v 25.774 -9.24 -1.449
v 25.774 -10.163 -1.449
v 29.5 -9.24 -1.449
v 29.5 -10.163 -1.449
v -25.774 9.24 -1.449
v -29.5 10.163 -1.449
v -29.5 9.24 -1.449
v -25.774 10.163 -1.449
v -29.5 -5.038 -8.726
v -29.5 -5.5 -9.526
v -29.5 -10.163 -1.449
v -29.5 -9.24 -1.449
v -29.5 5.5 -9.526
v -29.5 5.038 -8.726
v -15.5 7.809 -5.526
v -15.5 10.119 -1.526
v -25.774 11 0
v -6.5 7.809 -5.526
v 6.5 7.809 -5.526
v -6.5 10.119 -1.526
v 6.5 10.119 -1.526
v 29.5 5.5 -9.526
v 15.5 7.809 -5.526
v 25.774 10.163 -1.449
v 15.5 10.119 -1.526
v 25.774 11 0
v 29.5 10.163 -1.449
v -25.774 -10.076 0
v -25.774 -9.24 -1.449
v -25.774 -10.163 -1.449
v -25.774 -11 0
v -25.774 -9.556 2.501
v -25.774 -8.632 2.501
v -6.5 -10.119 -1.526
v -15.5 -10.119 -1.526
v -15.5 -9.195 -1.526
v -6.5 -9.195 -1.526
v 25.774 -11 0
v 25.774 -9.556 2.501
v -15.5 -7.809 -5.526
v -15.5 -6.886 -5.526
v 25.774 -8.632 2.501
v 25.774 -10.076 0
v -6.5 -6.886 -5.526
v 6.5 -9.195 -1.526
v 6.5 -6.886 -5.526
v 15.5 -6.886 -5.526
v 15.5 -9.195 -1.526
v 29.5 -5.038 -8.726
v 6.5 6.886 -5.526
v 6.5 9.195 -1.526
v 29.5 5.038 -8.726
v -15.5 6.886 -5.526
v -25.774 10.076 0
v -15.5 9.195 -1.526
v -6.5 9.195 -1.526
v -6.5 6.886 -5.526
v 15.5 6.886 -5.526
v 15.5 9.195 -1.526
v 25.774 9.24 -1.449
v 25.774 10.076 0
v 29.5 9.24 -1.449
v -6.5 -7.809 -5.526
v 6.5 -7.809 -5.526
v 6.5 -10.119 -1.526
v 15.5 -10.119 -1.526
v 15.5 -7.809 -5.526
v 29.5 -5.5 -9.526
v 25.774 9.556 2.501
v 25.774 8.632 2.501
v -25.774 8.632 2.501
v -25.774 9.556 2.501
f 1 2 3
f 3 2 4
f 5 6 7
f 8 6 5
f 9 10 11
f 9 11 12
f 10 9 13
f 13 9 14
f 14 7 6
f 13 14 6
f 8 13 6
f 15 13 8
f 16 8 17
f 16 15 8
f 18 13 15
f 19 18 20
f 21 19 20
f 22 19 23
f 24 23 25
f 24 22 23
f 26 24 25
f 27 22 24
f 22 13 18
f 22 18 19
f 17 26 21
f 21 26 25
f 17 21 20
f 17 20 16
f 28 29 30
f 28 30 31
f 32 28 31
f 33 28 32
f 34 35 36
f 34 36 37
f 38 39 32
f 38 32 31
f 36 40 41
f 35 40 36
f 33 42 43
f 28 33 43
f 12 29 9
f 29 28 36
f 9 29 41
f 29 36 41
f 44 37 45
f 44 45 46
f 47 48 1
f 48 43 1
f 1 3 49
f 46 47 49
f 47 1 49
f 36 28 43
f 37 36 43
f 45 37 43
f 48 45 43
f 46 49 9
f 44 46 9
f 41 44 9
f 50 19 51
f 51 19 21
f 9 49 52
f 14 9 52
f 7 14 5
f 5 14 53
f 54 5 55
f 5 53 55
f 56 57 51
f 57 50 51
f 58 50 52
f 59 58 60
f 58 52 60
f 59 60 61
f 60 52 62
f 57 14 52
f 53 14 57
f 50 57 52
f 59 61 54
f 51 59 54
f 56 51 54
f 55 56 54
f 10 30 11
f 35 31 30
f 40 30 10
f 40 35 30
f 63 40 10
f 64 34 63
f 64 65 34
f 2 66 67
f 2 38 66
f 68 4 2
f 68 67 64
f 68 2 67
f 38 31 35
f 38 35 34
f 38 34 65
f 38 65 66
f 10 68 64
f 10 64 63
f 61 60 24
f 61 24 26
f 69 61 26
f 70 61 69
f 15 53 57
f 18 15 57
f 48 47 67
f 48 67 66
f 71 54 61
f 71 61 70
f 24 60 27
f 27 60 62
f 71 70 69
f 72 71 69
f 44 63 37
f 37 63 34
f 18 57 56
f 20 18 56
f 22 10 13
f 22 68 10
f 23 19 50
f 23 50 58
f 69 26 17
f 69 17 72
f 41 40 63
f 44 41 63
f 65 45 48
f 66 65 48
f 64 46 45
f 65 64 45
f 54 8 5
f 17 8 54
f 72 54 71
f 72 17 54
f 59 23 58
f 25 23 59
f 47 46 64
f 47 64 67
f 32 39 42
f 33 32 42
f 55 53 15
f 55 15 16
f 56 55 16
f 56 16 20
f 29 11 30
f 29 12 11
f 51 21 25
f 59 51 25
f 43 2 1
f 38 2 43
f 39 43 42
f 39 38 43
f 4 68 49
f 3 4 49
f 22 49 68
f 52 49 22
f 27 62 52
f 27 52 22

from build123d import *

# Parameters (mm, degrees)
F2_DEPTH = 29.5
F3_DEPTH = 30
F5_DEPTH = 45.85
F6_W     = 9
F6_H     = 4
F7_DEPTH = 12.5
F8_W     = 4
F8_H     = 4
F9_DEPTH = 12.5


with BuildPart() as f2:
    # F0 (on Right) → F2 (new body, symmetric)
    with BuildSketch(Plane.YZ):
        Polygon((11, 0), (5.5, 9.526279), (-5.5, 9.526279), (-11, 0), (-5.5, -9.526279), (5.5, -9.526279), align=None)
    extrude(amount=F2_DEPTH, both=True)

    # F1 (on Right) → F3 (cut, symmetric)
    with BuildSketch(Plane.YZ):
        Polygon((-5.03812, 8.726279), (-10.07624, 0), (-5.03812, -8.726279), (5.03812, -8.726279), (10.07624, 0), (5.03812, 8.726279), align=None)
    extrude(amount=F3_DEPTH, both=True, mode=Mode.SUBTRACT)

    # F4 (on face) → F5 (cut, symmetric)
    with BuildSketch(Plane.YZ):
        Polygon((-12.379561, 14.501398), (-12.379561, 2.501398), (-9.555817, 2.501398), (-5.5, 9.526279), (5.5, 9.526279), (9.555817, 2.501398), (12.266592, 2.501398), (12.266592, 14.501398), align=None)
        Polygon((-5.5, 9.526279), (-9.555817, 2.501398), (9.555817, 2.501398), (5.5, 9.526279), align=None)
    extrude(amount=F5_DEPTH, both=True, mode=Mode.SUBTRACT)

    # F6 (on Front) → F7 (cut, symmetric)
    with BuildSketch(Plane.XZ):
        with Locations((11, -3.526279)):
            Rectangle(F6_W, F6_H)
        with Locations((-11, -3.526279)):
            Rectangle(F6_W, F6_H)
    extrude(amount=F7_DEPTH, both=True, mode=Mode.SUBTRACT)

    # F8 (on Front) → F9 (cut, symmetric)
    with BuildSketch(Plane.XZ):
        with Locations((-27.774018, 0.550773)):
            Rectangle(F8_W, F8_H)
        with Locations((27.774018, 0.550773)):
            Rectangle(F8_W, F8_H)
    extrude(amount=F9_DEPTH, both=True, mode=Mode.SUBTRACT)


solid = f2.part
